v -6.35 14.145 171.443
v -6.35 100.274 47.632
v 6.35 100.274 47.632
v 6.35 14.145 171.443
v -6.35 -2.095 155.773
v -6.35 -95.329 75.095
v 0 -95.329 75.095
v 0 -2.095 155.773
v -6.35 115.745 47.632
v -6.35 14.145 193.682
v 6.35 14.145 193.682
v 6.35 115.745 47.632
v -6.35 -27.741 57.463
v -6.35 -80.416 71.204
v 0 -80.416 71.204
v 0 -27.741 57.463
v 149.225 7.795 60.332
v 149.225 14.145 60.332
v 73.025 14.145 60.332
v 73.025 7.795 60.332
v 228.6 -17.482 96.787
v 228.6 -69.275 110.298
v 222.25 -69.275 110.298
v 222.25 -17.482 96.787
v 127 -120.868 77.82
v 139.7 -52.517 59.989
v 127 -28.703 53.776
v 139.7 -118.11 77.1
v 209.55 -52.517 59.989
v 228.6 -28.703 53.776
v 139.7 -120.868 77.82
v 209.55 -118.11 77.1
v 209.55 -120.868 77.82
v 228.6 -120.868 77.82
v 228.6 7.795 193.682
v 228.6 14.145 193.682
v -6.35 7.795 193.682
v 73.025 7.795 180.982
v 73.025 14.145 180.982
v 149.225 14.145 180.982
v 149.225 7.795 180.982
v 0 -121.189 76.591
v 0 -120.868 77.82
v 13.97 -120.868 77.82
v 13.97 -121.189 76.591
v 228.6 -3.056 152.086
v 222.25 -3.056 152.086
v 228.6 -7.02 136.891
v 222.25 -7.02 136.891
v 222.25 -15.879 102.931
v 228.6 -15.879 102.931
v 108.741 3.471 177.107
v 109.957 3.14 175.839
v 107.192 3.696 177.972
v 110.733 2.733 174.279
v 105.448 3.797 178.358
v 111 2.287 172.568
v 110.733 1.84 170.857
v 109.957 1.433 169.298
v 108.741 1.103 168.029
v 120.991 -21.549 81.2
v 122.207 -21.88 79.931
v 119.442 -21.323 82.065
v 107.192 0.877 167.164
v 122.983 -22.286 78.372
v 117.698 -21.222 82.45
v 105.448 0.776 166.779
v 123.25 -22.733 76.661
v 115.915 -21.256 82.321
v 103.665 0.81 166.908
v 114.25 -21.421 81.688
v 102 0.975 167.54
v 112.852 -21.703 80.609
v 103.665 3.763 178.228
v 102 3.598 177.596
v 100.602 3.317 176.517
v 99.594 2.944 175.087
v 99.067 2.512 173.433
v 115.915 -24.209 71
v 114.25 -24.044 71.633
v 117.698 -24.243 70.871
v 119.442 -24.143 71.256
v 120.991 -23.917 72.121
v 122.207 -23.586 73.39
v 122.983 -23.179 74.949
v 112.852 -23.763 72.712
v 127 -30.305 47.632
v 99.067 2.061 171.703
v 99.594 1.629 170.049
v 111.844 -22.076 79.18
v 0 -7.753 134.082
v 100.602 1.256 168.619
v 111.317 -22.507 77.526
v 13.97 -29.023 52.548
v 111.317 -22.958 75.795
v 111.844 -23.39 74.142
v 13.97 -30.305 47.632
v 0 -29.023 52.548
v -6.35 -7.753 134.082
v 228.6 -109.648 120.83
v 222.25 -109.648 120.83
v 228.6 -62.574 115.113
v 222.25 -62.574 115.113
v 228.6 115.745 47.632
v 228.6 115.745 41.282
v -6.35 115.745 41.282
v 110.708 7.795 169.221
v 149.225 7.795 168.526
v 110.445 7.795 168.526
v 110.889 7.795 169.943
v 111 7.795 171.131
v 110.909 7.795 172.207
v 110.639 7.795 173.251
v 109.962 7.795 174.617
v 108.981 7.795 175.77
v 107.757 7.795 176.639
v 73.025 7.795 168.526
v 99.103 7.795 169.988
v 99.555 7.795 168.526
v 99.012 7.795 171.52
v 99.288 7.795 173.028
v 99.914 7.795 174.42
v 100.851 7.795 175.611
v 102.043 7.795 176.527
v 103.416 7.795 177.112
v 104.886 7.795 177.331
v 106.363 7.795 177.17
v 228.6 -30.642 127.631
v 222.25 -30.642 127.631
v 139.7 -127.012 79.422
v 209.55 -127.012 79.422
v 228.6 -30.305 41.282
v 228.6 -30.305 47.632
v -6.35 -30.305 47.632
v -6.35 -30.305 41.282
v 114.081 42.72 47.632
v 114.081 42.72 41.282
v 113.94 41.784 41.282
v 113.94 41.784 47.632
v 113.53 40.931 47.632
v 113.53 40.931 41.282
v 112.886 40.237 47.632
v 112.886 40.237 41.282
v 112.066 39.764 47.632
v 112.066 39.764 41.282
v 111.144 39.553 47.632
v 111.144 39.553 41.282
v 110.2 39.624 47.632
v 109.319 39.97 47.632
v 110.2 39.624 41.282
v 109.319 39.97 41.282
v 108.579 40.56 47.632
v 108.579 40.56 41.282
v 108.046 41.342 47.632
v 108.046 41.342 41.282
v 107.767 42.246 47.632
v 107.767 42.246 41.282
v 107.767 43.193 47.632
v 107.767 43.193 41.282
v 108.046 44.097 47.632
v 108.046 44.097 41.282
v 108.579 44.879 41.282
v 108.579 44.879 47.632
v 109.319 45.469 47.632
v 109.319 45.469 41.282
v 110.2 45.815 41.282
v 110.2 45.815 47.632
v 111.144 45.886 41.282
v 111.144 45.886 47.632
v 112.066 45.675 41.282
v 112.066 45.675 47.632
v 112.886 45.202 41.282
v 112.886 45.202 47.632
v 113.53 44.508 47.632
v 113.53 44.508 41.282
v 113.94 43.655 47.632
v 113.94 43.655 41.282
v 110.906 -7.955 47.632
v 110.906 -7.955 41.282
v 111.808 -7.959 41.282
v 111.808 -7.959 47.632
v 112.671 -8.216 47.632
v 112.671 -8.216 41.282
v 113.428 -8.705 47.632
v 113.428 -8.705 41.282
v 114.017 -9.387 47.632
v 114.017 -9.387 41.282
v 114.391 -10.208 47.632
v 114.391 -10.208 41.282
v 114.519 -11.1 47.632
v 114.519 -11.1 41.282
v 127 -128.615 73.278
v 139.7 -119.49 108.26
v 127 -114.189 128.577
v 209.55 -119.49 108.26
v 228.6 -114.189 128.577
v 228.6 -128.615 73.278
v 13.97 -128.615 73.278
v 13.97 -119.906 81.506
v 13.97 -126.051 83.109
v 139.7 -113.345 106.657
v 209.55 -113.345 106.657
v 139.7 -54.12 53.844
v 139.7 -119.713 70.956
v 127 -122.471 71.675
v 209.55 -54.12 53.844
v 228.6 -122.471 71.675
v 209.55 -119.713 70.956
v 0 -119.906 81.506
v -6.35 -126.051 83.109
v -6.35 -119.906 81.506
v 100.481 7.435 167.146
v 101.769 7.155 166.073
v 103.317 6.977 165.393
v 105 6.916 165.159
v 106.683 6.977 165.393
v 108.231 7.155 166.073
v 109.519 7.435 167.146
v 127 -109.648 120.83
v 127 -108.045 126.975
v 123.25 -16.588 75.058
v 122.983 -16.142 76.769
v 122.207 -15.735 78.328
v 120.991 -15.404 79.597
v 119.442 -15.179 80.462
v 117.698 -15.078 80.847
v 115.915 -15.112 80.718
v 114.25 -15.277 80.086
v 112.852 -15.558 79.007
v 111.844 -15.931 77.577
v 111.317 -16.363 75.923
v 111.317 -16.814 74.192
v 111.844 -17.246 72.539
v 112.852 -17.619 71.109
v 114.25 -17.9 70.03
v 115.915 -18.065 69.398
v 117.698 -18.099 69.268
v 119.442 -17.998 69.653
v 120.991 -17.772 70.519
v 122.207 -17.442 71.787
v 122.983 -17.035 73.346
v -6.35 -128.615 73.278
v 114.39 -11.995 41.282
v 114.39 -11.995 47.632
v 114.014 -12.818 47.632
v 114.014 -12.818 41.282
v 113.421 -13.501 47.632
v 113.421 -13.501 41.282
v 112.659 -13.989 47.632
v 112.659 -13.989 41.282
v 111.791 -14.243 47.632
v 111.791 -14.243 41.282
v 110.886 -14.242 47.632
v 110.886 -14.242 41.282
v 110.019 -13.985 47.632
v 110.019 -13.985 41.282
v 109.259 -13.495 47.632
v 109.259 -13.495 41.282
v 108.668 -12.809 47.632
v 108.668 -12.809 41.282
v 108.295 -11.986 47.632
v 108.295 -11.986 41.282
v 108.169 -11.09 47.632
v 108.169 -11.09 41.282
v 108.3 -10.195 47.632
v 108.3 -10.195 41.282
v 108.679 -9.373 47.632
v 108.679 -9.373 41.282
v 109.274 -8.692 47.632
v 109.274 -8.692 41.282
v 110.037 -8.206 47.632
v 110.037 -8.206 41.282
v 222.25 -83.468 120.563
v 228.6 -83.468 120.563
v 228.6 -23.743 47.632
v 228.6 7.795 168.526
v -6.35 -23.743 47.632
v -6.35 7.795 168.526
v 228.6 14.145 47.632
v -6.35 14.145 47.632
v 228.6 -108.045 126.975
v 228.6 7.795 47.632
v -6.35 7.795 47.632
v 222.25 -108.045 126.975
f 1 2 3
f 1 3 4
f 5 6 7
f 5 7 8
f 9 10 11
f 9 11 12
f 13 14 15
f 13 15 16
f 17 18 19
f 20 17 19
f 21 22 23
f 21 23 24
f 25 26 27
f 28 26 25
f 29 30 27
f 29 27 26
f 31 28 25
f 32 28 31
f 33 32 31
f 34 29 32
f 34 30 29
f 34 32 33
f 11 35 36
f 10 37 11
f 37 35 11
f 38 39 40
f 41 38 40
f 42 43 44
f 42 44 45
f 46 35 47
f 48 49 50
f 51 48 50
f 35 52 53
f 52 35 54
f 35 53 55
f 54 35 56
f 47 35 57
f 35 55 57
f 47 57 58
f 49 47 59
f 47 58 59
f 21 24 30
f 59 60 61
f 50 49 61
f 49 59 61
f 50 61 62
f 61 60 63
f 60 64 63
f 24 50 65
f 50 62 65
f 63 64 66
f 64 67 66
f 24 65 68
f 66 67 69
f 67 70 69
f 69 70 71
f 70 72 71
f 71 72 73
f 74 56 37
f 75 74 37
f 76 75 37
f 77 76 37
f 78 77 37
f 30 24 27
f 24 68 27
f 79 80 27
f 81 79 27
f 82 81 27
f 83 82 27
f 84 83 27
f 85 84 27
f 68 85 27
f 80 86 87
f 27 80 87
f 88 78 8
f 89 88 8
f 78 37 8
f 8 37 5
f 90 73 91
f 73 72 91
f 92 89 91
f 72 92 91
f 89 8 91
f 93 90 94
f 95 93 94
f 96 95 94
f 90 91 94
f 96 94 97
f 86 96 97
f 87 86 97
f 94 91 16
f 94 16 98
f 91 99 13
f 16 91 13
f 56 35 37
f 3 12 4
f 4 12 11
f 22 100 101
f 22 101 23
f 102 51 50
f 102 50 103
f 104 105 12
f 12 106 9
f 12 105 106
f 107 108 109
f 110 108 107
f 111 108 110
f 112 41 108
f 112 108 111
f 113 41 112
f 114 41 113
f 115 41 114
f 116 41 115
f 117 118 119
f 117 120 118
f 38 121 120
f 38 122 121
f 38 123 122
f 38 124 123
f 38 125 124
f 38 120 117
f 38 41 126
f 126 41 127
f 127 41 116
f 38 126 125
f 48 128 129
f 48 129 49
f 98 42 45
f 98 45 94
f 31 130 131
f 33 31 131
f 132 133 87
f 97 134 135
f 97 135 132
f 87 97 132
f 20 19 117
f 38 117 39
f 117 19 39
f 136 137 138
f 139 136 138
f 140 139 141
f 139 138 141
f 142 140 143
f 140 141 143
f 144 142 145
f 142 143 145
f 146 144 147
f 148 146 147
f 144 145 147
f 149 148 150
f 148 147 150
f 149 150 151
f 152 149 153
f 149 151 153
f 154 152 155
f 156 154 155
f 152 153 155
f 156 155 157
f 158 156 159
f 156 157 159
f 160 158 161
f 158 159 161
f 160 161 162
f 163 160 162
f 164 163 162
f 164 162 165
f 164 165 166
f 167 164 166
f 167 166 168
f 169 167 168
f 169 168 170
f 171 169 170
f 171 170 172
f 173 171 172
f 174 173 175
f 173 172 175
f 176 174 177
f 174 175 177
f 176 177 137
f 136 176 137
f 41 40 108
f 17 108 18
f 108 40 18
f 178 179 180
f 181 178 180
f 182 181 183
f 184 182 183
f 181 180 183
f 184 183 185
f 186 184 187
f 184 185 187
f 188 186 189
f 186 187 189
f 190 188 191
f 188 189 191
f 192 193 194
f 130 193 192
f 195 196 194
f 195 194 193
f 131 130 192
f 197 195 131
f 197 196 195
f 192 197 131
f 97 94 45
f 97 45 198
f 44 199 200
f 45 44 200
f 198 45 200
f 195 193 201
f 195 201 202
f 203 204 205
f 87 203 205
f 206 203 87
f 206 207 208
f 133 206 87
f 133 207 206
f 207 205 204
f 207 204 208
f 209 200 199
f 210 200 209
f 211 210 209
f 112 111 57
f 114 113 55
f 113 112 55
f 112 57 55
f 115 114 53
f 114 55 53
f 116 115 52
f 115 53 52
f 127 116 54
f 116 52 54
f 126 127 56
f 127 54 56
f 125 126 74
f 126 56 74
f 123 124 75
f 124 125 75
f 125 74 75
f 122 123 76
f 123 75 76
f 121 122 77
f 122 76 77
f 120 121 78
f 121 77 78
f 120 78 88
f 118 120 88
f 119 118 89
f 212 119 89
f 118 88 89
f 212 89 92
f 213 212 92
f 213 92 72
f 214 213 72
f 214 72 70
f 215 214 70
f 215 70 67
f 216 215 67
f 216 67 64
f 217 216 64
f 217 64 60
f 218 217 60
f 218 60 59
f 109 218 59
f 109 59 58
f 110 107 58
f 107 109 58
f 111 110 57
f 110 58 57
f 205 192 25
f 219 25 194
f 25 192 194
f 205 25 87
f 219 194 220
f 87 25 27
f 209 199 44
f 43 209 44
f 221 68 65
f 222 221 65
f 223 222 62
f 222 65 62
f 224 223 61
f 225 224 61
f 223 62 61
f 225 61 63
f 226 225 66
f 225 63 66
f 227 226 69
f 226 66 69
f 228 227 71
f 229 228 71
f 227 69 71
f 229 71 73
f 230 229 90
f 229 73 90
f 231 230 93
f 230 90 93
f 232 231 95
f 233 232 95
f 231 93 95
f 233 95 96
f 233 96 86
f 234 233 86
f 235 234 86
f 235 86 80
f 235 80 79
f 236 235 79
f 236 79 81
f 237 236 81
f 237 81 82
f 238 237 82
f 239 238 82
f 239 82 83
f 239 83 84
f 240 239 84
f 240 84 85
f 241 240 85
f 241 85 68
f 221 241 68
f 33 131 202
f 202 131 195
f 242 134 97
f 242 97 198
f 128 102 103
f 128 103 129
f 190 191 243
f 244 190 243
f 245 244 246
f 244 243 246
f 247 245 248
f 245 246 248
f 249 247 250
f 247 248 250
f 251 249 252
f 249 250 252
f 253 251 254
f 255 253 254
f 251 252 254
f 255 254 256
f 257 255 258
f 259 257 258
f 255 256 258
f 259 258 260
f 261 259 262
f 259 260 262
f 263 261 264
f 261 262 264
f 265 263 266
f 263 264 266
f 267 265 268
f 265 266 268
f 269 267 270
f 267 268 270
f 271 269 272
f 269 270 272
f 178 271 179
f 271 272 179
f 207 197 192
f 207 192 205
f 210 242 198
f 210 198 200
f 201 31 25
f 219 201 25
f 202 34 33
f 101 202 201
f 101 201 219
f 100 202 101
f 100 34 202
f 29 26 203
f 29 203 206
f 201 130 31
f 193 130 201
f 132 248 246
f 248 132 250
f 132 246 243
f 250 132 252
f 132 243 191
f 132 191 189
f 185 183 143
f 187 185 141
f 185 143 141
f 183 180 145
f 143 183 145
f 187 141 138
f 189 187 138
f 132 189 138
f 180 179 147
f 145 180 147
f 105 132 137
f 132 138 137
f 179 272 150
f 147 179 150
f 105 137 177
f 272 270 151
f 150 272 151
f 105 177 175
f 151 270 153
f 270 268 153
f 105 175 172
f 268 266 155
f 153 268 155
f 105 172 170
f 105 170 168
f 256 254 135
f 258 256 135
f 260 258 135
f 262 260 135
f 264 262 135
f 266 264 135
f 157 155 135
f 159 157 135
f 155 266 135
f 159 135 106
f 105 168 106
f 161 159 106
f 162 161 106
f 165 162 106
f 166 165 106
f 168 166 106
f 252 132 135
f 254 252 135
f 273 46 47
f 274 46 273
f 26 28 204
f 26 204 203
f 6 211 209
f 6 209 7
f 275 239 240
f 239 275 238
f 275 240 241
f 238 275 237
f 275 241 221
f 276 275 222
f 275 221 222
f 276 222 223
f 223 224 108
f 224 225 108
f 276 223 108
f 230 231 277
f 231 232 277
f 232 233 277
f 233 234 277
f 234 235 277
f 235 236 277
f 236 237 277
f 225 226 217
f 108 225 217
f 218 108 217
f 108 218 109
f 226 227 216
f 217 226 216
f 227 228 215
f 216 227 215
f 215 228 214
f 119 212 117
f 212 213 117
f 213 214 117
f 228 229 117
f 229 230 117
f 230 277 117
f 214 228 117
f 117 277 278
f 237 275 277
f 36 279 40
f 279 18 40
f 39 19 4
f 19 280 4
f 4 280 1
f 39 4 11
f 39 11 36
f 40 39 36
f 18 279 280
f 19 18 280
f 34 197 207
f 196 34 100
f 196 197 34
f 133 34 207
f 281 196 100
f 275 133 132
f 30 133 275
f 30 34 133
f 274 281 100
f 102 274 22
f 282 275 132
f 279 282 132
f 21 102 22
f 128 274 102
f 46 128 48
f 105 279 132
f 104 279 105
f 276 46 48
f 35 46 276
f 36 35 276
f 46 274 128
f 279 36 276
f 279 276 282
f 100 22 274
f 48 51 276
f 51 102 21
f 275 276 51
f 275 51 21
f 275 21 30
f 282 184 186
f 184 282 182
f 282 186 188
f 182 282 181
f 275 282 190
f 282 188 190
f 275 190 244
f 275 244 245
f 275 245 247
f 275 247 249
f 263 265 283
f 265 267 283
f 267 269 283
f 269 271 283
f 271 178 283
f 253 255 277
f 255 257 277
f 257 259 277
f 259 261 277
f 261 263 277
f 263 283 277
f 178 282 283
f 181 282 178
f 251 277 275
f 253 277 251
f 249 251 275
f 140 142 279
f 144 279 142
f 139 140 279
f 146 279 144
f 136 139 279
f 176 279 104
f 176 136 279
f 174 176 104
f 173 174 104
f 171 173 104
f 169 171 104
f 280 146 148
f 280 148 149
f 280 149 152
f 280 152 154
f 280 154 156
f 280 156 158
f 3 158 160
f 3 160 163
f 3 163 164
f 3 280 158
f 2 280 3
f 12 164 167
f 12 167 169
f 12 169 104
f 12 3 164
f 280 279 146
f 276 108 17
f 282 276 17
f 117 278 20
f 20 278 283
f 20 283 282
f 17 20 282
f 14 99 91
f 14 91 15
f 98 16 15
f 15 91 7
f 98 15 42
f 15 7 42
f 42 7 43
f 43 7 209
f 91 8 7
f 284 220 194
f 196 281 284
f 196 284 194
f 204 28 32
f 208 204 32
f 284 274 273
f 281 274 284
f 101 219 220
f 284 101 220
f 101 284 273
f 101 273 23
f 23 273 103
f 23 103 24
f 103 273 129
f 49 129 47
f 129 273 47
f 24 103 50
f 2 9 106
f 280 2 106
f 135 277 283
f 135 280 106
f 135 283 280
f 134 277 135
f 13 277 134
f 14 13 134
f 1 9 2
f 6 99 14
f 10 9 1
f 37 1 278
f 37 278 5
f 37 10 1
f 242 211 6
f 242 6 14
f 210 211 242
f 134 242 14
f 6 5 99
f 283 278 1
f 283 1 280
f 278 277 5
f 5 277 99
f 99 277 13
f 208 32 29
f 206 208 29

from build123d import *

# Parameters (mm, degrees)
F0_W      = 6.35
F0_H      = 146.05
F0_W_2    = 101.6
F0_H_2    = 6.35
F1_DEPTH  = 228.6
F4_DEPTH  = 101.6
F5_DEPTH  = 6.35
F7_W      = 69.85
F7_H      = 29.8027028753
F8_DEPTH  = 6.35
F6_W      = 69.85
F6_H      = 67.7882859973
F9_DEPTH  = 6.35
F10_DEPTH = 6.35
F12_DEPTH = 234.95
F13_R     = 3.175
F14_DEPTH = 6.35
F16_DEPTH = 20.32
F17_DEPTH = 6.35
F20_DEPTH = 6.35
F18_R     = 6
F21_DEPTH = 12.7
F23_DEPTH = 12.7


with BuildPart() as f1:
    # F0 (on Right) → F1 (new body)
    with BuildSketch(Plane.YZ):
        Polygon((-30.3053990938, 47.6320354104), (-30.3053990938, 41.2820354104), (14.1446009062, 41.2820354104), (14.1446009062, 47.6320354104), (7.7946009062, 47.6320354104), (7.7946009062, 193.6820354104), align=None)
        with Locations((10.9696009062, 120.6570354104)):
            Rectangle(F0_W, F0_H)
        with Locations((64.9446009062, 44.4570354104)):
            Rectangle(F0_W_2, F0_H_2)
    extrude(amount=F1_DEPTH)

    # F2 (on face) → F4 (join)
    with BuildSketch(Plane.YZ.offset(228.6)):
        Polygon((-128.6153139693, 73.2781001605), (-122.4709442896, 71.6752211137), (-120.8680652427, 77.8195907934), (-115.2579885786, 99.3248846724), (-109.6479119145, 120.8301785514), (-108.0450328676, 126.9745482311), (-114.1894025473, 128.577427278), align=None)
        Polygon((-122.4709442896, 71.6752211137), (-30.3053990938, 47.6320354104), (-28.7025200469, 53.7764050901), (-106.5976272263, 74.0968678326), (-120.8680652427, 77.8195907934), align=None)
    extrude(amount=-F4_DEPTH)

    # F3 (on face) → F5 (join)
    with BuildSketch(Plane.YZ.offset(228.6)):
        Polygon((-109.6479119145, 120.8301785514), (-69.2754185778, 110.2982237679), (-17.4823667187, 96.7869928482), (-15.8794876718, 102.9313625279), (-62.5744384004, 115.1126540223), (-83.4675541487, 120.5630320436), (-108.0450328676, 126.9745482311), align=None)
    extrude(amount=-F5_DEPTH)

    # F7 (on face) → F8 (cut, through all)
    with BuildSketch(Plane(origin=(0, -138.3183697556, 36.0830529797), x_dir=(1, 0, 0), z_dir=(0, -0.9676172724, 0.2524218971))):
        with Locations((174.625, 59.6911852871)):
            Rectangle(F7_W, F7_H)
    extrude(amount=-F8_DEPTH, mode=Mode.SUBTRACT)

    # F6 (on face) → F9 (cut, through all)
    with BuildSketch(Plane(origin=(0, 11.3059348332, 43.3394168605), x_dir=(1, 0, 0), z_dir=(0, 0.2524218971, 0.9676172724))):
        with Locations((174.625, -99.8529585577)):
            Rectangle(F6_W, F6_H)
    extrude(amount=-F9_DEPTH, mode=Mode.SUBTRACT)

    # F2 (on face) + F5_face (on face) + F0 (on Right) → F10 (join)
    with BuildSketch(Plane.YZ.offset(228.6)):
        Polygon((-83.4675541487, 120.5630320436), (-62.5744384004, 115.1126540223), (-30.6417442167, 127.6311188518), (-7.020366585, 136.8913266941), (-3.0564552968, 152.0863199656), align=None)
    with BuildSketch(Plane(origin=(228.6, -14.5704476362, 90.6728554843), x_dir=(0, 1, 0), z_dir=(1, 0, 0))):
        Polygon((22.3650485424, 103.0091799261), (-1.3090400356, 12.2585070436), (-99.6189549112, 37.9045717937), (-114.0448663331, -17.3947553238), (-15.7349514576, -43.0408200739), (-15.7349514576, -49.3908200739), (130.3150485424, -49.3908200739), (130.3150485424, -43.0408200739), (28.7150485424, -43.0408200739), (28.7150485424, 103.0091799261), align=None)
        Polygon((-2.9119190825, 6.1141373639), (-14.1320724107, -36.8964503942), (-106.2976176065, -12.8532646909), (-95.0774642783, 30.1573230671), align=None, mode=Mode.SUBTRACT)
    with BuildSketch(Plane.YZ):
        Polygon((-30.3053990938, 47.6320354104), (-30.3053990938, 41.2820354104), (14.1446009062, 41.2820354104), (14.1446009062, 47.6320354104), (7.7946009062, 47.6320354104), (7.7946009062, 193.6820354104), align=None)
        with Locations((64.9446009062, 44.4570354104)):
            Rectangle(F0_W_2, F0_H_2)
        with Locations((10.9696009062, 120.6570354104)):
            Rectangle(F0_W, F0_H)
    extrude(amount=-F10_DEPTH)

    # F11 (on face) → F12 (cut, through all)
    with BuildSketch(Plane(origin=(-6.35, 0, 0), x_dir=(0, -1, 0), z_dir=(-1, 0, 0))):
        Polygon((23.742887054, 47.6320354104), (18.5949307967, 67.3658677301), (-7.7946009062, 168.5257392579), (-7.7946009062, 73.7693533301), (-7.7946009062, 47.6320354104), align=None)
    extrude(amount=-F12_DEPTH, mode=Mode.SUBTRACT)

    # F13 (on face) → F14 (cut, through all)
    with BuildSketch(Plane(origin=(0, 0, 41.2820354104), x_dir=(1, 0, 0), z_dir=(0, 0, -1))):
        with BuildLine():
            ThreePointArc((110.906295836, 7.9551242506), (113.4283928169, 8.705126833), (114.518704164, 11.0998498276))
            ThreePointArc((114.518704164, 11.0998498276), (109.2590155112, 13.4945728222), (110.906295836, 7.9551242506))
        make_face()
        with Locations((110.906295836, -42.7196009062)):
            Circle(F13_R)
    extrude(amount=-F14_DEPTH, mode=Mode.SUBTRACT)

    # F15 (on face) → F16 (join)
    with BuildSketch(Plane(origin=(-6.35, 0, 0), x_dir=(0, -1, 0), z_dir=(-1, 0, 0))):
        Polygon((29.0230958563, 52.5475311542), (30.3053990938, 47.6320354104), (128.6153139693, 73.2781001605), (126.0507074943, 83.1090916481), (119.9063378146, 81.5062126012), (120.8680652427, 77.8195907934), (121.1886410521, 76.5907168574), align=None)
    extrude(amount=-F16_DEPTH)

    # F15 (on face) → F17 (join)
    with BuildSketch(Plane(origin=(-6.35, 0, 0), x_dir=(0, -1, 0), z_dir=(-1, 0, 0))):
        Polygon((27.7407926188, 57.463026898), (29.0230958563, 52.5475311542), (121.1886410521, 76.5907168574), (120.8680652427, 77.8195907934), (119.9063378146, 81.5062126012), (95.3288590957, 75.0946964137), (80.4160992001, 71.2044112235), align=None)
        Polygon((43.3673341555, 103.2638010329), (80.4160992001, 71.2044112235), (95.3288590957, 75.0946964137), (2.0947278686, 155.7729417735), (7.7533245088, 134.0816546527), align=None)
    extrude(amount=-F17_DEPTH)

    # F19 (on face) → F20 (cut)
    with BuildSketch(Plane(origin=(0, 14.1446009062, 0), x_dir=(-1, 0, 0), z_dir=(0, 1, 0))):
        Polygon((-73.025, 122.8082254529), (-73.025, 180.9820354104), (-114.1596585512, 180.9820354104), (-149.225, 180.9820354104), (-149.225, 126.8474459648), (-149.225, 60.3320354104), (-73.025, 60.3320354104), align=None)
    extrude(amount=-F20_DEPTH, mode=Mode.SUBTRACT)

    # F18 (on face) → F21 (cut)
    with BuildSketch(Plane(origin=(0, -40.0084548801, 10.4369882296), x_dir=(1, 0, 0), z_dir=(0, -0.9676172724, 0.2524218971))):
        with Locations((117.25, 68.4398338495)):
            Circle(F18_R)
        with Locations((105, 167.5570309162)):
            Circle(F18_R)
    extrude(amount=-F21_DEPTH, mode=Mode.SUBTRACT)

    # F22 (on face) → F23 (join)
    with BuildSketch(Plane(origin=(-6.35, 0, 0), x_dir=(0, -1, 0), z_dir=(-1, 0, 0))):
        Polygon((-14.1446009062, 171.4428658202), (-14.1446009062, 193.6820354104), (-115.7446009062, 47.6320354104), (-100.2738742348, 47.6320354104), (-84.3938715819, 70.4595392239), align=None)
    extrude(amount=-F23_DEPTH)


solid = f1.part
